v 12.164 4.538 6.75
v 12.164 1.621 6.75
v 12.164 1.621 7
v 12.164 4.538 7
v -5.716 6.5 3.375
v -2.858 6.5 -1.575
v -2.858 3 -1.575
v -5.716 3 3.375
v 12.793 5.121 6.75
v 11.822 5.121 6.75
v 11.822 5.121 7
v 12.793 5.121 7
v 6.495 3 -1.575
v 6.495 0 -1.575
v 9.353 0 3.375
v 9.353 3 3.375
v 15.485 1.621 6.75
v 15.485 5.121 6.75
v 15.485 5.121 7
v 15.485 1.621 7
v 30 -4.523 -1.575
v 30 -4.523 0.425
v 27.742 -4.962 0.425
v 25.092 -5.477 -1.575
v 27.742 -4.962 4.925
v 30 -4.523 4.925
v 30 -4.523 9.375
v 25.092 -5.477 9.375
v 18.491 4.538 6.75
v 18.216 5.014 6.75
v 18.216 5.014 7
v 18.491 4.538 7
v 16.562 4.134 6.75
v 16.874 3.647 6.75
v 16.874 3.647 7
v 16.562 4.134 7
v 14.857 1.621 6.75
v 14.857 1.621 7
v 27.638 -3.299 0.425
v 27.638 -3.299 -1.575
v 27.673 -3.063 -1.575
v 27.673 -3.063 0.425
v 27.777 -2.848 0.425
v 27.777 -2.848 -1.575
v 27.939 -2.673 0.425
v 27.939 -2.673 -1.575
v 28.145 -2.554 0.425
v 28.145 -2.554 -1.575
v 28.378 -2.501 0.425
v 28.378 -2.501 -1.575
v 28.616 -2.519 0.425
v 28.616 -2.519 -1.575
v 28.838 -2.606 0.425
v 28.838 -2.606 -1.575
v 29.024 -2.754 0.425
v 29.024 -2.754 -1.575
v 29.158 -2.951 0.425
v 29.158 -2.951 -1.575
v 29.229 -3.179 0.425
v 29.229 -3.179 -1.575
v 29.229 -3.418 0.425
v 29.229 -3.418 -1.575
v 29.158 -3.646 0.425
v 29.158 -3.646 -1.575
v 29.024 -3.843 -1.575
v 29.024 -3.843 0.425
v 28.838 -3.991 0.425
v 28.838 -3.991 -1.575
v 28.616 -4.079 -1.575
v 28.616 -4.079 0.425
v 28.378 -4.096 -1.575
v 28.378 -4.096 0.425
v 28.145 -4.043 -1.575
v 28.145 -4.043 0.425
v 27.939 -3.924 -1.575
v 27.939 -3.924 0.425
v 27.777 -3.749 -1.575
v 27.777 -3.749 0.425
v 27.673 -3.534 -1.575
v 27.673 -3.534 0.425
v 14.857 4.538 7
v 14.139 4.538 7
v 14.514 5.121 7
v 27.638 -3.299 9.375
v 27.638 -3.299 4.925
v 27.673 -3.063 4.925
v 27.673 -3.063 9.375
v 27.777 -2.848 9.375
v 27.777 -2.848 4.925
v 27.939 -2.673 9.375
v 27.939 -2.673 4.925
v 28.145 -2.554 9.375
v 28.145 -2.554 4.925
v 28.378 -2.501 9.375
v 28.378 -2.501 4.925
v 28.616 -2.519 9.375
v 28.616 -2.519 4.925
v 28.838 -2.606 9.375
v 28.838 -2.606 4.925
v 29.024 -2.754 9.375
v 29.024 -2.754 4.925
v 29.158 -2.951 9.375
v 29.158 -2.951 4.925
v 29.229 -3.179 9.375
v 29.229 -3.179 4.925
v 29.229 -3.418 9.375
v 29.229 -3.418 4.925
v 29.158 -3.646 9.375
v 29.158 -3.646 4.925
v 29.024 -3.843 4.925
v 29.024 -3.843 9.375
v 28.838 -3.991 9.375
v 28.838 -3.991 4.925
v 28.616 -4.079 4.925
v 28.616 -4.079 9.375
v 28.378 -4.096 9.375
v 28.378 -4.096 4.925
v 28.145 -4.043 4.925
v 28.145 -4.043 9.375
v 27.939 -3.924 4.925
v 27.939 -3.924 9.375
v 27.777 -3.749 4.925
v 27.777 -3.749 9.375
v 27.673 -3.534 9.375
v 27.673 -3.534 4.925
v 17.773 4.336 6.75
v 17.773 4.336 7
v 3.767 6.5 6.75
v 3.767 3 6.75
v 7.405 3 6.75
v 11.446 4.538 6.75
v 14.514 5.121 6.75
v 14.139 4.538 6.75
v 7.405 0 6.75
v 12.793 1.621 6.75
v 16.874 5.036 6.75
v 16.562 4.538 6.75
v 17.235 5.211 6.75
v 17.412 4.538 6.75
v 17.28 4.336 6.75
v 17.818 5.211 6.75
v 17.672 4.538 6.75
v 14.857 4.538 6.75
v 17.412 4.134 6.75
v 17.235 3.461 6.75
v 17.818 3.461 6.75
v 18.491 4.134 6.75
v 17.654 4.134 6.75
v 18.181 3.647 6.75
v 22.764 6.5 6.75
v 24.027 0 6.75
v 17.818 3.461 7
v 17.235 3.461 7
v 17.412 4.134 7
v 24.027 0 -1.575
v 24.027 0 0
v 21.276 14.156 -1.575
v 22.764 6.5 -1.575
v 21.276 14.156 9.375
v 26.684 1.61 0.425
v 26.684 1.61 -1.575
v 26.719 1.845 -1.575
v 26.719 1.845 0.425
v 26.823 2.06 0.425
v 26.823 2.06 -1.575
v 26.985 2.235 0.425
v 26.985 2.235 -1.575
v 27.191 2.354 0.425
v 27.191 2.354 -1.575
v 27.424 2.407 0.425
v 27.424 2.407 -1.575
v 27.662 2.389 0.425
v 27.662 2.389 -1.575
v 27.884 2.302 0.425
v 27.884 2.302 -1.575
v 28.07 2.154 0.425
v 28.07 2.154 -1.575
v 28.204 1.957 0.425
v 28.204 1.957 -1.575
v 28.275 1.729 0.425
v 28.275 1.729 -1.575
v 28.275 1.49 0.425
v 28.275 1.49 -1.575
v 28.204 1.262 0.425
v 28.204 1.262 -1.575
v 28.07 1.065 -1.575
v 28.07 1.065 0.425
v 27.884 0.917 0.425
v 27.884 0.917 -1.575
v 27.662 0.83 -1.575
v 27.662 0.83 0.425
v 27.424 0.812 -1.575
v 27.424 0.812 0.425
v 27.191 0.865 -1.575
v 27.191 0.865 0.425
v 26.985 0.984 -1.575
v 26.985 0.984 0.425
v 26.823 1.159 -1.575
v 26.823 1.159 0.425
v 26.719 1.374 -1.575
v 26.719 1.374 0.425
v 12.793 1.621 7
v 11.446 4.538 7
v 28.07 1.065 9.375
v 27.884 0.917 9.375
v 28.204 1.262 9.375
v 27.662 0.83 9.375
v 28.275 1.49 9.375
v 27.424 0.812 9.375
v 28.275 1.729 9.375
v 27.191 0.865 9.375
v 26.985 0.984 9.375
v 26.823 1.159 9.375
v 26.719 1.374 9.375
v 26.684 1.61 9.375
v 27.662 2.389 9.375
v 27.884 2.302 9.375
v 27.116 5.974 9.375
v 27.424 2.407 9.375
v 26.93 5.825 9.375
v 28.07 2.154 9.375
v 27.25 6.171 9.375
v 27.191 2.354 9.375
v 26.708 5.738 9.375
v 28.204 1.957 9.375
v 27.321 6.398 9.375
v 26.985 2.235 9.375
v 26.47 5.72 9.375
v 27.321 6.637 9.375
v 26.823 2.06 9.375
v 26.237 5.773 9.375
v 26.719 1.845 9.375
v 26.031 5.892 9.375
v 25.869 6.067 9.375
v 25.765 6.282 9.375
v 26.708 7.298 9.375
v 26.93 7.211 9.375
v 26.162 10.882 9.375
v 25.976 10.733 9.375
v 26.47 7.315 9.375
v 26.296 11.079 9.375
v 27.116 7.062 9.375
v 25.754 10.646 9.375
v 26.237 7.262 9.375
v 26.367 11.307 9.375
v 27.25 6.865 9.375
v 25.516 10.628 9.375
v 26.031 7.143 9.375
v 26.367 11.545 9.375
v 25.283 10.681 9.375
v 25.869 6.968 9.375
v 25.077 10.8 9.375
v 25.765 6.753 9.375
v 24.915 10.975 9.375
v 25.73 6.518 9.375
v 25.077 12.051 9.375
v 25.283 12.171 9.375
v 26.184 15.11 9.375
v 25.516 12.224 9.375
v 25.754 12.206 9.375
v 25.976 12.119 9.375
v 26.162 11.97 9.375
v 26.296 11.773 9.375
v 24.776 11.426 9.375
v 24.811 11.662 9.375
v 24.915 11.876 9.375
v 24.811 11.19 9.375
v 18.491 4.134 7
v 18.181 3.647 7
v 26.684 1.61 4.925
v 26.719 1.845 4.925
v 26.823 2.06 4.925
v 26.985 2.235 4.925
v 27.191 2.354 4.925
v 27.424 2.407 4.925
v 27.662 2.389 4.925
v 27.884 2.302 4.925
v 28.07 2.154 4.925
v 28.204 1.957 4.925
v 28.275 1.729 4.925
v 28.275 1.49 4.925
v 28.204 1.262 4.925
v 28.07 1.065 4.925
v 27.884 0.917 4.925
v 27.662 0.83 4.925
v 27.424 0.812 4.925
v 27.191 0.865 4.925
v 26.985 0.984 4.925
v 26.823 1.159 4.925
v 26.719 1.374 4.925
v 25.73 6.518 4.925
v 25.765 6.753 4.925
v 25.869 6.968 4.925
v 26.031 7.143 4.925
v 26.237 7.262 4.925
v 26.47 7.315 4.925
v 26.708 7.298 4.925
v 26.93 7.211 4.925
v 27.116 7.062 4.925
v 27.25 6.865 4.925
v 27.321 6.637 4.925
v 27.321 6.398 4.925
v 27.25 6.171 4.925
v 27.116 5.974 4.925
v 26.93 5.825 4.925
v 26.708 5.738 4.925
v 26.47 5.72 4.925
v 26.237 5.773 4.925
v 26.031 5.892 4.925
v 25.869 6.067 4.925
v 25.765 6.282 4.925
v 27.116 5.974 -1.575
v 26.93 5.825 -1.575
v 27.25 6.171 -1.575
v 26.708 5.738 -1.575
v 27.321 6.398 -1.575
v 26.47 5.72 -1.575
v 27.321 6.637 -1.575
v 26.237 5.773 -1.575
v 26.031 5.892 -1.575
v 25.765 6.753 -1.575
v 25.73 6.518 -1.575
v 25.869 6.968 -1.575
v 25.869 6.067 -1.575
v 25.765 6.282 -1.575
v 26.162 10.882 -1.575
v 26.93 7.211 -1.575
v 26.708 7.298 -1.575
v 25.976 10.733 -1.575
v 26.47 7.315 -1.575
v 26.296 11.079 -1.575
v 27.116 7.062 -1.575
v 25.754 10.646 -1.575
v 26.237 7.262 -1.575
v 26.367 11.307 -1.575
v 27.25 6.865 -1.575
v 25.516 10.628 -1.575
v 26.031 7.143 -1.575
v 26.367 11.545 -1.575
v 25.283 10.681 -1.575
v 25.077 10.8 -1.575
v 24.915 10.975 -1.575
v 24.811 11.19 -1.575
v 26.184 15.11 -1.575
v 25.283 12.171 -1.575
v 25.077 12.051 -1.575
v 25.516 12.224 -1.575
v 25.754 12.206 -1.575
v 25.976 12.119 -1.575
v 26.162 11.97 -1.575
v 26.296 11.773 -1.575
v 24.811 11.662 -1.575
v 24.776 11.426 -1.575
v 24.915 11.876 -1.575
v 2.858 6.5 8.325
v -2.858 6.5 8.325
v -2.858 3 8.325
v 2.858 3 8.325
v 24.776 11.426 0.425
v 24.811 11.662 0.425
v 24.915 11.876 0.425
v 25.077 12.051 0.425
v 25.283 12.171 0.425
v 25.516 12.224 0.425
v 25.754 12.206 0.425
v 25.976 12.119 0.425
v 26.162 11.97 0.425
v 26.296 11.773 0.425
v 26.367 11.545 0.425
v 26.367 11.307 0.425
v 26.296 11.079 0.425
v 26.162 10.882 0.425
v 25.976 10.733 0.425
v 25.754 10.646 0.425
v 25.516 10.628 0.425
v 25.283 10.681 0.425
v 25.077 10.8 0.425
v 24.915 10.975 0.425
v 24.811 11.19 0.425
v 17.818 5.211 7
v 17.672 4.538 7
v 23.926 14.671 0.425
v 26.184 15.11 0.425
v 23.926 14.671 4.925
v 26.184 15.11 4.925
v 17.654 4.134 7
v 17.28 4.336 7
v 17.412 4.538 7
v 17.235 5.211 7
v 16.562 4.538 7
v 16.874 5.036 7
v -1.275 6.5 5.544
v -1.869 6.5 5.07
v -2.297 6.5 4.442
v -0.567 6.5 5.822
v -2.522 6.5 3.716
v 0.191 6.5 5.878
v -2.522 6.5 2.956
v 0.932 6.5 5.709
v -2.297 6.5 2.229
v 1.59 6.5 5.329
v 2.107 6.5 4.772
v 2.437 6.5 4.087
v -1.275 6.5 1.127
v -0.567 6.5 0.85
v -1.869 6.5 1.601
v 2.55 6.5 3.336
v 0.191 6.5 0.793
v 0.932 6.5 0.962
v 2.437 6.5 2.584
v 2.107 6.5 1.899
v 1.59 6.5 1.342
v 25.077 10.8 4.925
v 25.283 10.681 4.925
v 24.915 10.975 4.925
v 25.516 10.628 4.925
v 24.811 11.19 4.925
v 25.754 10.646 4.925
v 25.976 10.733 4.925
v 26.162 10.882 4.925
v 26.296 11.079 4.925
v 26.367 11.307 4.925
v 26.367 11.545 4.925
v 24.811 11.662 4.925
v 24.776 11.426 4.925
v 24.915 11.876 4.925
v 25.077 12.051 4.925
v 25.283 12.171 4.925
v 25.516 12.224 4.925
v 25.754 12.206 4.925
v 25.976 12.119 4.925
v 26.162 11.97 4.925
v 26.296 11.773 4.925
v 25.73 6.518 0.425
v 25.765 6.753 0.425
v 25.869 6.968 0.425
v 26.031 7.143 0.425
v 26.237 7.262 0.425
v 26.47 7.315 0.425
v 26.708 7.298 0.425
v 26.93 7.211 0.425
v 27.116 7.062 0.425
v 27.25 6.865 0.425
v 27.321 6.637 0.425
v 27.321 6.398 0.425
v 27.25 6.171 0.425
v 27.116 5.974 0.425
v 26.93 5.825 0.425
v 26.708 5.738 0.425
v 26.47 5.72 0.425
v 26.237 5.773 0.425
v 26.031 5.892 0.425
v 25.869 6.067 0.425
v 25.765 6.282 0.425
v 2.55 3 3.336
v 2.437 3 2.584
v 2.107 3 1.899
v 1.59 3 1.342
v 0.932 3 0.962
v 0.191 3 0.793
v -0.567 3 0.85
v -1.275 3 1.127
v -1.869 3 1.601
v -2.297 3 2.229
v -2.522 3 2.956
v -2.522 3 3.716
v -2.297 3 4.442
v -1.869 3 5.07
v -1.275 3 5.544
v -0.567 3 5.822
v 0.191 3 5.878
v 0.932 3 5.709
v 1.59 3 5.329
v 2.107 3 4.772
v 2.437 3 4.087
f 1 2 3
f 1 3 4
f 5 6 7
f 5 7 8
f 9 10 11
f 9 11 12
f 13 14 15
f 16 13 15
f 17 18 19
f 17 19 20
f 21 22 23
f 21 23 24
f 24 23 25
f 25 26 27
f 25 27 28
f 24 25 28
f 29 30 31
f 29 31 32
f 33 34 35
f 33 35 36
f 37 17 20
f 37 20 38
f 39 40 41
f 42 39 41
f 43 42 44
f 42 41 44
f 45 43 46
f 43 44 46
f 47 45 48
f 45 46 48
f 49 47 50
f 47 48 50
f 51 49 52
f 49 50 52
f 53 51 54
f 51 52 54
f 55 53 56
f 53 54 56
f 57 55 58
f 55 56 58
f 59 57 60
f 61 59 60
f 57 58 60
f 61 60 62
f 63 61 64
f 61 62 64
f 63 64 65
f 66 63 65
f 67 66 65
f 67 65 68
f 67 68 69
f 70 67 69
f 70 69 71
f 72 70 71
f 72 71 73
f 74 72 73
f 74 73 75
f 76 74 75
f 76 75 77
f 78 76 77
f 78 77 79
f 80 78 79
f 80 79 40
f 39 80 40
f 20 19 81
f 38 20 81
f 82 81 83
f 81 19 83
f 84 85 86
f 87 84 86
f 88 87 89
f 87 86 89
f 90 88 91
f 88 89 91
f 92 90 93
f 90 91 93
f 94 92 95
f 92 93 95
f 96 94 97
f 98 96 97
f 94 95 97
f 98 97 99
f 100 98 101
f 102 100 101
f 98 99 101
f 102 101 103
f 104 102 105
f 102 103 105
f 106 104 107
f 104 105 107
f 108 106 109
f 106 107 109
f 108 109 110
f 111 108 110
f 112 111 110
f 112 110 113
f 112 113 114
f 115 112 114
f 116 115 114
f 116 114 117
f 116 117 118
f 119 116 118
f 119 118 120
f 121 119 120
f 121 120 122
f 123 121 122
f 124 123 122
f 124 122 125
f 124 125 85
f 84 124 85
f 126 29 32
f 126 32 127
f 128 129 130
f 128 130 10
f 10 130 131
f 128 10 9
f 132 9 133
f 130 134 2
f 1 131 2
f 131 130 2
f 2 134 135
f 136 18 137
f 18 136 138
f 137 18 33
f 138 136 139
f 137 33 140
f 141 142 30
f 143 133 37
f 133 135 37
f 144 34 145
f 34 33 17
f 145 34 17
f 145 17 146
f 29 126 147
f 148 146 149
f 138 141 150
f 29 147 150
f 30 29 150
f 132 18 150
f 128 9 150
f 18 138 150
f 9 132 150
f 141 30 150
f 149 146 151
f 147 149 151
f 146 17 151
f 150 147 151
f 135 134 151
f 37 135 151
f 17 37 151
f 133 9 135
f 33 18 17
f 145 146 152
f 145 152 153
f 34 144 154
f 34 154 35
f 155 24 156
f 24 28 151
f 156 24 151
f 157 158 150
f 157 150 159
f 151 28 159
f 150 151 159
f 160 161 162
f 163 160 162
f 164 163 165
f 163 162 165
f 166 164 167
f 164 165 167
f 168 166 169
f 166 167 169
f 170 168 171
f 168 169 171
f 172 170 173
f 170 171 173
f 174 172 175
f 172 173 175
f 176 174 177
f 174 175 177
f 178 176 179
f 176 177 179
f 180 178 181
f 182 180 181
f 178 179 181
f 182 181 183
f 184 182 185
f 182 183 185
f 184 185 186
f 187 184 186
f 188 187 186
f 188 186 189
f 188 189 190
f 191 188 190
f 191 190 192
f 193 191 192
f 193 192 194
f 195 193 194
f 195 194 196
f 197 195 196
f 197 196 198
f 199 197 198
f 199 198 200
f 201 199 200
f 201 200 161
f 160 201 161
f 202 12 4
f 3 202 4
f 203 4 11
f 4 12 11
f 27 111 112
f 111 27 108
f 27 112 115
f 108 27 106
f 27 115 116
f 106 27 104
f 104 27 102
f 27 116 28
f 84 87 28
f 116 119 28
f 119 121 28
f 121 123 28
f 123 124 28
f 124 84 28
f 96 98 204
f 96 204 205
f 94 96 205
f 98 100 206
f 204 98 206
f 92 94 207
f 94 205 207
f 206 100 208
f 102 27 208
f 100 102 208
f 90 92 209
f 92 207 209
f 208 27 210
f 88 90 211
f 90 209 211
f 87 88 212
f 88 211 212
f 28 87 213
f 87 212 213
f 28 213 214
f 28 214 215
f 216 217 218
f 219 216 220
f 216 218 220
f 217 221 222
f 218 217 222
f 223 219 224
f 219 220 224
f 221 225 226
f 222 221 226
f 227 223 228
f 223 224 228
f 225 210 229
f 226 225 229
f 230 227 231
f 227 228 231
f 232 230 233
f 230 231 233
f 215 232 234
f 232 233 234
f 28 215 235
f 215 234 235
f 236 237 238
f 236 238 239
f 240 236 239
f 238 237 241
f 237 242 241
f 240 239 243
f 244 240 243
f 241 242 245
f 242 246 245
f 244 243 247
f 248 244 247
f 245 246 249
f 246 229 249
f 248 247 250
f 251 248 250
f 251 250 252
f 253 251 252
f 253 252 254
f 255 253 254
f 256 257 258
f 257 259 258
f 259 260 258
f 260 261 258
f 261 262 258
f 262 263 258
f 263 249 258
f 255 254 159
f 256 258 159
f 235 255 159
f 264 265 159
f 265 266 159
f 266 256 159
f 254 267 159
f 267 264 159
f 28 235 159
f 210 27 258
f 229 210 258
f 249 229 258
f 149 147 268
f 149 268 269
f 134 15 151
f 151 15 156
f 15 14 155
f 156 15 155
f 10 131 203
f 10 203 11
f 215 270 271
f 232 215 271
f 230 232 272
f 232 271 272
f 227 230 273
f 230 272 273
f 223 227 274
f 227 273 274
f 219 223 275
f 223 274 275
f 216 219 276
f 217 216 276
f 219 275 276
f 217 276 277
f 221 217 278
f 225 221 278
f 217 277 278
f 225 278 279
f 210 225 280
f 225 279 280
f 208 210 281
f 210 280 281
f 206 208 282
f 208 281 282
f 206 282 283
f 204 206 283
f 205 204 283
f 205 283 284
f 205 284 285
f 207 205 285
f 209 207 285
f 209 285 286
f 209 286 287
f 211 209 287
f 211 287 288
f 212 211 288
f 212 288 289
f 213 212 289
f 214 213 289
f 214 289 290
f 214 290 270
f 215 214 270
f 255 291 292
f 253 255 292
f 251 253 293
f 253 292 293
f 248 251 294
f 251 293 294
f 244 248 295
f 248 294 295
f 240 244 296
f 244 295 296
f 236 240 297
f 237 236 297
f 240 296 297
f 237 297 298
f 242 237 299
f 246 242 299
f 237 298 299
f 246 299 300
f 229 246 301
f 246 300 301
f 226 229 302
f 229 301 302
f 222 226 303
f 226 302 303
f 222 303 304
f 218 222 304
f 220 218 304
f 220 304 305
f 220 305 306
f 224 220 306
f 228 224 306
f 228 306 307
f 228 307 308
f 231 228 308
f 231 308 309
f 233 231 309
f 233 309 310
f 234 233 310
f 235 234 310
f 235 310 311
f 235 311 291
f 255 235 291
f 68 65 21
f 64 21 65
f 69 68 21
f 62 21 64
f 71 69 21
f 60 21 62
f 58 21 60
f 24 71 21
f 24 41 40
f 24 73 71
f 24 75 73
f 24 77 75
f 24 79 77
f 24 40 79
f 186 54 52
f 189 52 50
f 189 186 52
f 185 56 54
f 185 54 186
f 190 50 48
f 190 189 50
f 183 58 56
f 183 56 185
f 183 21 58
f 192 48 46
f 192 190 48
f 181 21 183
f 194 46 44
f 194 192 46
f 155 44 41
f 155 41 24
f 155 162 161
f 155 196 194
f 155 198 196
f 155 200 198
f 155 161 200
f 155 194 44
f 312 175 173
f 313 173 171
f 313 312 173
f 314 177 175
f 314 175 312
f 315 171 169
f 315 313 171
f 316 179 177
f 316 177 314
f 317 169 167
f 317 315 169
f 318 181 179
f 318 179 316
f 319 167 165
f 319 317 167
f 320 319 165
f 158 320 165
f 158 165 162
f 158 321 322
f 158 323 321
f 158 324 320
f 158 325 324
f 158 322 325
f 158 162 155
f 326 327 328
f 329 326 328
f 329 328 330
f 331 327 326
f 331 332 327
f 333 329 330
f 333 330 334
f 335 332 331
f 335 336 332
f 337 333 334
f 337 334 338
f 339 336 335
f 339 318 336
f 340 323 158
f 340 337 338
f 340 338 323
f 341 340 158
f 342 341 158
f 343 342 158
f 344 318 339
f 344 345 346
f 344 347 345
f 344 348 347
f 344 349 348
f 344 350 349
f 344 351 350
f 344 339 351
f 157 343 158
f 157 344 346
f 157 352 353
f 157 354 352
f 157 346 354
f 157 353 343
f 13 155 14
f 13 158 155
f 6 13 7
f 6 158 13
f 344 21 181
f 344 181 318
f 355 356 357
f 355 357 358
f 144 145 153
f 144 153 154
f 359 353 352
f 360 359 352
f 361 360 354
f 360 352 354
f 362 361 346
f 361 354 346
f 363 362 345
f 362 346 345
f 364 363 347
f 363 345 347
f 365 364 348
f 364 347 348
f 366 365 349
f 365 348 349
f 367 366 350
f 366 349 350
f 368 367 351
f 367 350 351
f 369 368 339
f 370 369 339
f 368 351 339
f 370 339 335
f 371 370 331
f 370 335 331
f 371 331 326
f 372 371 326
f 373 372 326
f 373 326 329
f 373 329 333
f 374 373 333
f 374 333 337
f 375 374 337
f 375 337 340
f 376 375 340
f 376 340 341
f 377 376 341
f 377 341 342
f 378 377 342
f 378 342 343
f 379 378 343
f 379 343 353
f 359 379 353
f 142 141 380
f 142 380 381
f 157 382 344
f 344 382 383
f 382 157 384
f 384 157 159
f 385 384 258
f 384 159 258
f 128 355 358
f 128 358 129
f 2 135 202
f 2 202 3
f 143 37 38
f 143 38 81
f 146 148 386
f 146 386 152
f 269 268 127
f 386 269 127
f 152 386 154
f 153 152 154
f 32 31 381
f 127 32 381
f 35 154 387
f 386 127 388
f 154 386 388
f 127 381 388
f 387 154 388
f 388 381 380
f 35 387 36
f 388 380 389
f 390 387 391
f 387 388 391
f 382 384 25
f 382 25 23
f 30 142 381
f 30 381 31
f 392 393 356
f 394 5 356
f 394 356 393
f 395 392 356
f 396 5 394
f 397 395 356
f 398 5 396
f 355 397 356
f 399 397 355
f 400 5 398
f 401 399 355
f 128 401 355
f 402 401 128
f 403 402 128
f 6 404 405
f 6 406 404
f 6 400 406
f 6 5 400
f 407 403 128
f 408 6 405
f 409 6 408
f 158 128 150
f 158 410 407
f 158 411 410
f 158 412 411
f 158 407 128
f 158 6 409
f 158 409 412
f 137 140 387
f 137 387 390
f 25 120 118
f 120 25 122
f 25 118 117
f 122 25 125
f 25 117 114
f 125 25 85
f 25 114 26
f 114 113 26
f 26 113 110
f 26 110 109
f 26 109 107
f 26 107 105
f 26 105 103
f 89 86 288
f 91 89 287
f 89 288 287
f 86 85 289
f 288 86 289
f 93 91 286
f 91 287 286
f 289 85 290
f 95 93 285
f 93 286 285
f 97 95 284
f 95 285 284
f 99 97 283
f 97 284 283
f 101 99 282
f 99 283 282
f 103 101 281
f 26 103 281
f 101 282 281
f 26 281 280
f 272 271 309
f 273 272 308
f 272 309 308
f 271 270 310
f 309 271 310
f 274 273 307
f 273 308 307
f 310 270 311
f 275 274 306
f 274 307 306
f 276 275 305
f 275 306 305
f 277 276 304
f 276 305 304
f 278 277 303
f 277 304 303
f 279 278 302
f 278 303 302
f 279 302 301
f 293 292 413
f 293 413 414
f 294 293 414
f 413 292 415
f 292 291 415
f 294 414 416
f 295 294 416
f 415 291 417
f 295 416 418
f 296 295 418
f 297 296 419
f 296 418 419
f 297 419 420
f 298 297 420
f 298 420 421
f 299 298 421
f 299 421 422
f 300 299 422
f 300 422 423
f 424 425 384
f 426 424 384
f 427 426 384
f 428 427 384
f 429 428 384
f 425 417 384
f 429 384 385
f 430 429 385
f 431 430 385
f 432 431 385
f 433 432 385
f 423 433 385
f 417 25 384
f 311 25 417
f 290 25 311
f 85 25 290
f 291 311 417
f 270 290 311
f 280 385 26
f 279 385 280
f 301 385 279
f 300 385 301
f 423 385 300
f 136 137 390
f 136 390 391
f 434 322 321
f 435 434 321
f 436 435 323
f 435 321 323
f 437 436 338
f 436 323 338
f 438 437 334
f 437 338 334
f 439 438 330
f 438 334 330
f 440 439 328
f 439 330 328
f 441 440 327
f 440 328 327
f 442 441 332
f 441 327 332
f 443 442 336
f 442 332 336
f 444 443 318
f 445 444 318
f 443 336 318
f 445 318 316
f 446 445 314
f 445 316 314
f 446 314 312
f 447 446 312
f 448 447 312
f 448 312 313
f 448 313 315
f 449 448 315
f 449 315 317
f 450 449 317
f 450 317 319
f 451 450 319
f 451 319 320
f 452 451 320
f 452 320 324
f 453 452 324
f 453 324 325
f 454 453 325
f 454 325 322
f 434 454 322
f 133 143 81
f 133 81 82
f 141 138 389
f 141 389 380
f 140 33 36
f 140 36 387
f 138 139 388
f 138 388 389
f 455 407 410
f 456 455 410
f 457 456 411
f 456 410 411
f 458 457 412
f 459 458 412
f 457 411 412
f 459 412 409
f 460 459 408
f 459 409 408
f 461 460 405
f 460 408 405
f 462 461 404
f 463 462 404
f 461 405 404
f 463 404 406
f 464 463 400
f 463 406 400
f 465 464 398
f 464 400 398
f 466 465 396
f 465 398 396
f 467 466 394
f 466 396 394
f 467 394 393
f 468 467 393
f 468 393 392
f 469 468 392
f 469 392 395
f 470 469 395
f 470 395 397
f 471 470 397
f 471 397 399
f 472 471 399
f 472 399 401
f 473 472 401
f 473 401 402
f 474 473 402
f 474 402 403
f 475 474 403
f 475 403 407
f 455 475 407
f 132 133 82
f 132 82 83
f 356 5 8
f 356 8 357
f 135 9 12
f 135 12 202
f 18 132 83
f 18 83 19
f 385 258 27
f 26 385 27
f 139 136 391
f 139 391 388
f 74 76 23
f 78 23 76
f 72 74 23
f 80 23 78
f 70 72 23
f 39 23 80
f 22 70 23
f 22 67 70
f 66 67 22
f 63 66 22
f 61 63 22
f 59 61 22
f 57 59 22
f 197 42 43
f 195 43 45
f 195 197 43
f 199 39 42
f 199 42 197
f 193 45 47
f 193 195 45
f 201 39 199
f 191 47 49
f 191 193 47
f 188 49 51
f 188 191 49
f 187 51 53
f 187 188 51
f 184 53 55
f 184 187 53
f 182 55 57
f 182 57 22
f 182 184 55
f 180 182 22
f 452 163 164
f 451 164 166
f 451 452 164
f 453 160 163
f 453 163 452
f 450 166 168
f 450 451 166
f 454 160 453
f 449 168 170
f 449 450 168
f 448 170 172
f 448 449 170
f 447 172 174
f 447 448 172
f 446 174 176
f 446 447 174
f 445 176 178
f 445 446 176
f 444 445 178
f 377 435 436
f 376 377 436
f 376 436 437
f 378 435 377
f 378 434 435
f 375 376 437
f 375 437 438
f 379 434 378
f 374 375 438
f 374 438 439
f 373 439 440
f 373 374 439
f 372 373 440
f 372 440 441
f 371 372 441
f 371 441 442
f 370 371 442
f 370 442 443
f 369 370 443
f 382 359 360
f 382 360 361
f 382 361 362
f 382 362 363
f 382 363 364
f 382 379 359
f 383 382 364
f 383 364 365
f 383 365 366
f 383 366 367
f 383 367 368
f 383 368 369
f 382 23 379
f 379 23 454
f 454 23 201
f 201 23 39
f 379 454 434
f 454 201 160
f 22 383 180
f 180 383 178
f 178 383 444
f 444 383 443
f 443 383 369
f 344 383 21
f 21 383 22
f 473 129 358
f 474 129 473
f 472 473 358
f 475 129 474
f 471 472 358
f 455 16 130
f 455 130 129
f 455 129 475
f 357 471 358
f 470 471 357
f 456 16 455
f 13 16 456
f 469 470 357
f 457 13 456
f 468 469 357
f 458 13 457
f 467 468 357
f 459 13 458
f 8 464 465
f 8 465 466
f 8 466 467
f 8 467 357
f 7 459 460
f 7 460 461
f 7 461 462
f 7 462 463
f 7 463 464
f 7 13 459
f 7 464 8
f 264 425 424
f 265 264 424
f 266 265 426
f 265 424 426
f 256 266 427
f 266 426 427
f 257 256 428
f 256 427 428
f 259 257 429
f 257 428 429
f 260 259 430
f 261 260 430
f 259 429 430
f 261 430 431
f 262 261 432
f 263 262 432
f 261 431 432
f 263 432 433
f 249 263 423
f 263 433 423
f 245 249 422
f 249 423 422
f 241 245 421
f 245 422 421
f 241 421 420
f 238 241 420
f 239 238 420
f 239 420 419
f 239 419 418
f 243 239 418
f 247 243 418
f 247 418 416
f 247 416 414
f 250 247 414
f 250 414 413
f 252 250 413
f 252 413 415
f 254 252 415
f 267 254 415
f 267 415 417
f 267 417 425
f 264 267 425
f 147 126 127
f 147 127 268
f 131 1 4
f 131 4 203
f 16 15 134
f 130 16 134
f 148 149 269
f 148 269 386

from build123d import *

# Parameters (mm, degrees)
SKETCH1_W                = 25
SKETCH1_H                = 6.75
BOSS_EXTRUDE1_DEPTH      = 6.5
BOSS_EXTRUDE4_DEPTH      = 6.5
BOSS_EXTRUDE3_DEPTH      = 6
BOSS_EXTRUDE3_DEPTH_BACK = 4.95
SKETCH4_W                = 2.3
SKETCH4_H                = 4.5
CUT_EXTRUDE1_DEPTH       = 23
SKETCH6_R                = 2.55
CUT_EXTRUDE2_DEPTH       = 10
BOSS_EXTRUDE5_DEPTH      = 1.575
CUT_EXTRUDE3_DEPTH       = 3
SKETCH9_R                = 0.8
CUT_EXTRUDE4_DEPTH       = 10.95
BOSS_EXTRUDE6_DEPTH      = 0.25


with BuildPart() as part:
    # Sketch1 → Boss-Extrude1 (new body)
    with BuildSketch(Plane(origin=(0, 0, 0), x_dir=(1, 0, 0), z_dir=(0, 1, 0))):
        with Locations((12.5, -3.375)):
            Rectangle(SKETCH1_W, SKETCH1_H)
    extrude(amount=BOSS_EXTRUDE1_DEPTH)

    # Sketch5 → Boss-Extrude4 (add)
    with BuildSketch(Plane(origin=(0, 6.5, 0), x_dir=(1, 0, 0), z_dir=(0, 1, 0))):
        Polygon((-5.715767665, -3.375), (-2.857883832, -8.325), (2.857883832, -8.325), (5.715767665, -3.375), (2.857883832, 1.575), (-2.857883832, 1.575), align=None)
    extrude(amount=-BOSS_EXTRUDE4_DEPTH)

    # Sketch3 → Boss-Extrude3 (add, two sides)
    with BuildSketch(Plane.XY.offset(3.375)) as boss_extrude3_sk:
        Polygon((21.275684175, 14.155521181), (26.183820092, 15.109566157), (30, -4.522977512), (25.091864083, -5.477022488), align=None)
    extrude(amount=BOSS_EXTRUDE3_DEPTH)
    extrude(boss_extrude3_sk.sketch, amount=-BOSS_EXTRUDE3_DEPTH_BACK)

    # Sketch4 → Cut-Extrude1 (cut)
    with BuildSketch(Plane(origin=(-1.876769127, 9.65514015, 0), x_dir=(0.981627183, 0.190808995, 0), z_dir=(-0.190808995, 0.981627183, 0))):
        with Locations((27.435790708, -2.675)):
            Rectangle(SKETCH4_W, SKETCH4_H)
    extrude(amount=-CUT_EXTRUDE1_DEPTH, mode=Mode.SUBTRACT)

    # Sketch6 → Cut-Extrude2 (cut)
    with BuildSketch(Plane(origin=(0, 6.5, 0), x_dir=(1, 0, 0), z_dir=(0, 1, 0))):
        with Locations((0, -3.335615973)):
            Circle(SKETCH6_R)
    extrude(amount=-CUT_EXTRUDE2_DEPTH, mode=Mode.SUBTRACT)

    # Sketch7 → Boss-Extrude5 (add)
    with BuildSketch(Plane(origin=(0, 0, -1.575), x_dir=(-1, 0, 0), z_dir=(0, 0, -1))):
        Polygon((-2.857883832, 0), (-24.027238758, 0), (-25.091864083, -5.477022488), (-30, -4.522977512), (-26.183820092, 15.109566157), (-21.275684175, 14.155521181), (-22.763766749, 6.5), (-2.857883832, 6.5), align=None)
    extrude(amount=-BOSS_EXTRUDE5_DEPTH)

    # Sketch8 → Cut-Extrude3 (cut)
    with BuildSketch(Plane(origin=(0, 0, 0), x_dir=(-1, 0, 0), z_dir=(0, -1, 0))):
        Polygon((-4.67653718, -11.475), (4.67653718, -11.475), (9.353074361, -3.375), (4.67653718, 4.725), (-4.67653718, 4.725), (-9.353074361, -3.375), align=None)
    extrude(amount=-CUT_EXTRUDE3_DEPTH, mode=Mode.SUBTRACT)

    # Sketch9 → Cut-Extrude4 (cut)
    with BuildSketch(Plane(origin=(0, 0, -1.575), x_dir=(-1, 0, 0), z_dir=(0, 0, -1))):
        with Locations((-28.437671168, -3.29858843)):
            Circle(SKETCH9_R)
        with Locations((-27.483626192, 1.609547487)):
            Circle(SKETCH9_R)
        with Locations((-26.529581215, 6.517683404)):
            Circle(SKETCH9_R)
        with Locations((-25.575536238, 11.425819321)):
            Circle(SKETCH9_R)
    extrude(amount=-CUT_EXTRUDE4_DEPTH, mode=Mode.SUBTRACT)

    # Sketch10 → Boss-Extrude6 (add)
    with BuildSketch(Plane.XY.offset(6.75)):
        Polygon((11.821517388, 5.121255448), (12.792571074, 5.121255448), (12.792571074, 1.621255448), (12.164365946, 1.621255448), (12.164365946, 4.537922115), (11.446417228, 4.537922115), align=None)
        Polygon((14.513825081, 5.121255448), (15.484878766, 5.121255448), (15.484878766, 1.621255448), (14.856673638, 1.621255448), (14.856673638, 4.537922115), (14.13872492, 4.537922115), align=None)
        Polygon((17.234878766, 5.210999038), (17.8182121, 5.210999038), (17.672378766, 4.537922115), (18.215748157, 5.013983814), (18.491289023, 4.537922115), (17.773340305, 4.335999038), (18.491289023, 4.134075961), (18.180692068, 3.647497435), (17.6541496, 4.134075961), (17.8182121, 3.460999038), (17.234878766, 3.460999038), (17.412262581, 4.134075961), (16.873801042, 3.647497435), (16.561801843, 4.134075961), (17.279750561, 4.335999038), (16.561801843, 4.537922115), (16.873801042, 5.036419711), (17.412262581, 4.537922115), align=None)
    extrude(amount=BOSS_EXTRUDE6_DEPTH)


solid = part.part
